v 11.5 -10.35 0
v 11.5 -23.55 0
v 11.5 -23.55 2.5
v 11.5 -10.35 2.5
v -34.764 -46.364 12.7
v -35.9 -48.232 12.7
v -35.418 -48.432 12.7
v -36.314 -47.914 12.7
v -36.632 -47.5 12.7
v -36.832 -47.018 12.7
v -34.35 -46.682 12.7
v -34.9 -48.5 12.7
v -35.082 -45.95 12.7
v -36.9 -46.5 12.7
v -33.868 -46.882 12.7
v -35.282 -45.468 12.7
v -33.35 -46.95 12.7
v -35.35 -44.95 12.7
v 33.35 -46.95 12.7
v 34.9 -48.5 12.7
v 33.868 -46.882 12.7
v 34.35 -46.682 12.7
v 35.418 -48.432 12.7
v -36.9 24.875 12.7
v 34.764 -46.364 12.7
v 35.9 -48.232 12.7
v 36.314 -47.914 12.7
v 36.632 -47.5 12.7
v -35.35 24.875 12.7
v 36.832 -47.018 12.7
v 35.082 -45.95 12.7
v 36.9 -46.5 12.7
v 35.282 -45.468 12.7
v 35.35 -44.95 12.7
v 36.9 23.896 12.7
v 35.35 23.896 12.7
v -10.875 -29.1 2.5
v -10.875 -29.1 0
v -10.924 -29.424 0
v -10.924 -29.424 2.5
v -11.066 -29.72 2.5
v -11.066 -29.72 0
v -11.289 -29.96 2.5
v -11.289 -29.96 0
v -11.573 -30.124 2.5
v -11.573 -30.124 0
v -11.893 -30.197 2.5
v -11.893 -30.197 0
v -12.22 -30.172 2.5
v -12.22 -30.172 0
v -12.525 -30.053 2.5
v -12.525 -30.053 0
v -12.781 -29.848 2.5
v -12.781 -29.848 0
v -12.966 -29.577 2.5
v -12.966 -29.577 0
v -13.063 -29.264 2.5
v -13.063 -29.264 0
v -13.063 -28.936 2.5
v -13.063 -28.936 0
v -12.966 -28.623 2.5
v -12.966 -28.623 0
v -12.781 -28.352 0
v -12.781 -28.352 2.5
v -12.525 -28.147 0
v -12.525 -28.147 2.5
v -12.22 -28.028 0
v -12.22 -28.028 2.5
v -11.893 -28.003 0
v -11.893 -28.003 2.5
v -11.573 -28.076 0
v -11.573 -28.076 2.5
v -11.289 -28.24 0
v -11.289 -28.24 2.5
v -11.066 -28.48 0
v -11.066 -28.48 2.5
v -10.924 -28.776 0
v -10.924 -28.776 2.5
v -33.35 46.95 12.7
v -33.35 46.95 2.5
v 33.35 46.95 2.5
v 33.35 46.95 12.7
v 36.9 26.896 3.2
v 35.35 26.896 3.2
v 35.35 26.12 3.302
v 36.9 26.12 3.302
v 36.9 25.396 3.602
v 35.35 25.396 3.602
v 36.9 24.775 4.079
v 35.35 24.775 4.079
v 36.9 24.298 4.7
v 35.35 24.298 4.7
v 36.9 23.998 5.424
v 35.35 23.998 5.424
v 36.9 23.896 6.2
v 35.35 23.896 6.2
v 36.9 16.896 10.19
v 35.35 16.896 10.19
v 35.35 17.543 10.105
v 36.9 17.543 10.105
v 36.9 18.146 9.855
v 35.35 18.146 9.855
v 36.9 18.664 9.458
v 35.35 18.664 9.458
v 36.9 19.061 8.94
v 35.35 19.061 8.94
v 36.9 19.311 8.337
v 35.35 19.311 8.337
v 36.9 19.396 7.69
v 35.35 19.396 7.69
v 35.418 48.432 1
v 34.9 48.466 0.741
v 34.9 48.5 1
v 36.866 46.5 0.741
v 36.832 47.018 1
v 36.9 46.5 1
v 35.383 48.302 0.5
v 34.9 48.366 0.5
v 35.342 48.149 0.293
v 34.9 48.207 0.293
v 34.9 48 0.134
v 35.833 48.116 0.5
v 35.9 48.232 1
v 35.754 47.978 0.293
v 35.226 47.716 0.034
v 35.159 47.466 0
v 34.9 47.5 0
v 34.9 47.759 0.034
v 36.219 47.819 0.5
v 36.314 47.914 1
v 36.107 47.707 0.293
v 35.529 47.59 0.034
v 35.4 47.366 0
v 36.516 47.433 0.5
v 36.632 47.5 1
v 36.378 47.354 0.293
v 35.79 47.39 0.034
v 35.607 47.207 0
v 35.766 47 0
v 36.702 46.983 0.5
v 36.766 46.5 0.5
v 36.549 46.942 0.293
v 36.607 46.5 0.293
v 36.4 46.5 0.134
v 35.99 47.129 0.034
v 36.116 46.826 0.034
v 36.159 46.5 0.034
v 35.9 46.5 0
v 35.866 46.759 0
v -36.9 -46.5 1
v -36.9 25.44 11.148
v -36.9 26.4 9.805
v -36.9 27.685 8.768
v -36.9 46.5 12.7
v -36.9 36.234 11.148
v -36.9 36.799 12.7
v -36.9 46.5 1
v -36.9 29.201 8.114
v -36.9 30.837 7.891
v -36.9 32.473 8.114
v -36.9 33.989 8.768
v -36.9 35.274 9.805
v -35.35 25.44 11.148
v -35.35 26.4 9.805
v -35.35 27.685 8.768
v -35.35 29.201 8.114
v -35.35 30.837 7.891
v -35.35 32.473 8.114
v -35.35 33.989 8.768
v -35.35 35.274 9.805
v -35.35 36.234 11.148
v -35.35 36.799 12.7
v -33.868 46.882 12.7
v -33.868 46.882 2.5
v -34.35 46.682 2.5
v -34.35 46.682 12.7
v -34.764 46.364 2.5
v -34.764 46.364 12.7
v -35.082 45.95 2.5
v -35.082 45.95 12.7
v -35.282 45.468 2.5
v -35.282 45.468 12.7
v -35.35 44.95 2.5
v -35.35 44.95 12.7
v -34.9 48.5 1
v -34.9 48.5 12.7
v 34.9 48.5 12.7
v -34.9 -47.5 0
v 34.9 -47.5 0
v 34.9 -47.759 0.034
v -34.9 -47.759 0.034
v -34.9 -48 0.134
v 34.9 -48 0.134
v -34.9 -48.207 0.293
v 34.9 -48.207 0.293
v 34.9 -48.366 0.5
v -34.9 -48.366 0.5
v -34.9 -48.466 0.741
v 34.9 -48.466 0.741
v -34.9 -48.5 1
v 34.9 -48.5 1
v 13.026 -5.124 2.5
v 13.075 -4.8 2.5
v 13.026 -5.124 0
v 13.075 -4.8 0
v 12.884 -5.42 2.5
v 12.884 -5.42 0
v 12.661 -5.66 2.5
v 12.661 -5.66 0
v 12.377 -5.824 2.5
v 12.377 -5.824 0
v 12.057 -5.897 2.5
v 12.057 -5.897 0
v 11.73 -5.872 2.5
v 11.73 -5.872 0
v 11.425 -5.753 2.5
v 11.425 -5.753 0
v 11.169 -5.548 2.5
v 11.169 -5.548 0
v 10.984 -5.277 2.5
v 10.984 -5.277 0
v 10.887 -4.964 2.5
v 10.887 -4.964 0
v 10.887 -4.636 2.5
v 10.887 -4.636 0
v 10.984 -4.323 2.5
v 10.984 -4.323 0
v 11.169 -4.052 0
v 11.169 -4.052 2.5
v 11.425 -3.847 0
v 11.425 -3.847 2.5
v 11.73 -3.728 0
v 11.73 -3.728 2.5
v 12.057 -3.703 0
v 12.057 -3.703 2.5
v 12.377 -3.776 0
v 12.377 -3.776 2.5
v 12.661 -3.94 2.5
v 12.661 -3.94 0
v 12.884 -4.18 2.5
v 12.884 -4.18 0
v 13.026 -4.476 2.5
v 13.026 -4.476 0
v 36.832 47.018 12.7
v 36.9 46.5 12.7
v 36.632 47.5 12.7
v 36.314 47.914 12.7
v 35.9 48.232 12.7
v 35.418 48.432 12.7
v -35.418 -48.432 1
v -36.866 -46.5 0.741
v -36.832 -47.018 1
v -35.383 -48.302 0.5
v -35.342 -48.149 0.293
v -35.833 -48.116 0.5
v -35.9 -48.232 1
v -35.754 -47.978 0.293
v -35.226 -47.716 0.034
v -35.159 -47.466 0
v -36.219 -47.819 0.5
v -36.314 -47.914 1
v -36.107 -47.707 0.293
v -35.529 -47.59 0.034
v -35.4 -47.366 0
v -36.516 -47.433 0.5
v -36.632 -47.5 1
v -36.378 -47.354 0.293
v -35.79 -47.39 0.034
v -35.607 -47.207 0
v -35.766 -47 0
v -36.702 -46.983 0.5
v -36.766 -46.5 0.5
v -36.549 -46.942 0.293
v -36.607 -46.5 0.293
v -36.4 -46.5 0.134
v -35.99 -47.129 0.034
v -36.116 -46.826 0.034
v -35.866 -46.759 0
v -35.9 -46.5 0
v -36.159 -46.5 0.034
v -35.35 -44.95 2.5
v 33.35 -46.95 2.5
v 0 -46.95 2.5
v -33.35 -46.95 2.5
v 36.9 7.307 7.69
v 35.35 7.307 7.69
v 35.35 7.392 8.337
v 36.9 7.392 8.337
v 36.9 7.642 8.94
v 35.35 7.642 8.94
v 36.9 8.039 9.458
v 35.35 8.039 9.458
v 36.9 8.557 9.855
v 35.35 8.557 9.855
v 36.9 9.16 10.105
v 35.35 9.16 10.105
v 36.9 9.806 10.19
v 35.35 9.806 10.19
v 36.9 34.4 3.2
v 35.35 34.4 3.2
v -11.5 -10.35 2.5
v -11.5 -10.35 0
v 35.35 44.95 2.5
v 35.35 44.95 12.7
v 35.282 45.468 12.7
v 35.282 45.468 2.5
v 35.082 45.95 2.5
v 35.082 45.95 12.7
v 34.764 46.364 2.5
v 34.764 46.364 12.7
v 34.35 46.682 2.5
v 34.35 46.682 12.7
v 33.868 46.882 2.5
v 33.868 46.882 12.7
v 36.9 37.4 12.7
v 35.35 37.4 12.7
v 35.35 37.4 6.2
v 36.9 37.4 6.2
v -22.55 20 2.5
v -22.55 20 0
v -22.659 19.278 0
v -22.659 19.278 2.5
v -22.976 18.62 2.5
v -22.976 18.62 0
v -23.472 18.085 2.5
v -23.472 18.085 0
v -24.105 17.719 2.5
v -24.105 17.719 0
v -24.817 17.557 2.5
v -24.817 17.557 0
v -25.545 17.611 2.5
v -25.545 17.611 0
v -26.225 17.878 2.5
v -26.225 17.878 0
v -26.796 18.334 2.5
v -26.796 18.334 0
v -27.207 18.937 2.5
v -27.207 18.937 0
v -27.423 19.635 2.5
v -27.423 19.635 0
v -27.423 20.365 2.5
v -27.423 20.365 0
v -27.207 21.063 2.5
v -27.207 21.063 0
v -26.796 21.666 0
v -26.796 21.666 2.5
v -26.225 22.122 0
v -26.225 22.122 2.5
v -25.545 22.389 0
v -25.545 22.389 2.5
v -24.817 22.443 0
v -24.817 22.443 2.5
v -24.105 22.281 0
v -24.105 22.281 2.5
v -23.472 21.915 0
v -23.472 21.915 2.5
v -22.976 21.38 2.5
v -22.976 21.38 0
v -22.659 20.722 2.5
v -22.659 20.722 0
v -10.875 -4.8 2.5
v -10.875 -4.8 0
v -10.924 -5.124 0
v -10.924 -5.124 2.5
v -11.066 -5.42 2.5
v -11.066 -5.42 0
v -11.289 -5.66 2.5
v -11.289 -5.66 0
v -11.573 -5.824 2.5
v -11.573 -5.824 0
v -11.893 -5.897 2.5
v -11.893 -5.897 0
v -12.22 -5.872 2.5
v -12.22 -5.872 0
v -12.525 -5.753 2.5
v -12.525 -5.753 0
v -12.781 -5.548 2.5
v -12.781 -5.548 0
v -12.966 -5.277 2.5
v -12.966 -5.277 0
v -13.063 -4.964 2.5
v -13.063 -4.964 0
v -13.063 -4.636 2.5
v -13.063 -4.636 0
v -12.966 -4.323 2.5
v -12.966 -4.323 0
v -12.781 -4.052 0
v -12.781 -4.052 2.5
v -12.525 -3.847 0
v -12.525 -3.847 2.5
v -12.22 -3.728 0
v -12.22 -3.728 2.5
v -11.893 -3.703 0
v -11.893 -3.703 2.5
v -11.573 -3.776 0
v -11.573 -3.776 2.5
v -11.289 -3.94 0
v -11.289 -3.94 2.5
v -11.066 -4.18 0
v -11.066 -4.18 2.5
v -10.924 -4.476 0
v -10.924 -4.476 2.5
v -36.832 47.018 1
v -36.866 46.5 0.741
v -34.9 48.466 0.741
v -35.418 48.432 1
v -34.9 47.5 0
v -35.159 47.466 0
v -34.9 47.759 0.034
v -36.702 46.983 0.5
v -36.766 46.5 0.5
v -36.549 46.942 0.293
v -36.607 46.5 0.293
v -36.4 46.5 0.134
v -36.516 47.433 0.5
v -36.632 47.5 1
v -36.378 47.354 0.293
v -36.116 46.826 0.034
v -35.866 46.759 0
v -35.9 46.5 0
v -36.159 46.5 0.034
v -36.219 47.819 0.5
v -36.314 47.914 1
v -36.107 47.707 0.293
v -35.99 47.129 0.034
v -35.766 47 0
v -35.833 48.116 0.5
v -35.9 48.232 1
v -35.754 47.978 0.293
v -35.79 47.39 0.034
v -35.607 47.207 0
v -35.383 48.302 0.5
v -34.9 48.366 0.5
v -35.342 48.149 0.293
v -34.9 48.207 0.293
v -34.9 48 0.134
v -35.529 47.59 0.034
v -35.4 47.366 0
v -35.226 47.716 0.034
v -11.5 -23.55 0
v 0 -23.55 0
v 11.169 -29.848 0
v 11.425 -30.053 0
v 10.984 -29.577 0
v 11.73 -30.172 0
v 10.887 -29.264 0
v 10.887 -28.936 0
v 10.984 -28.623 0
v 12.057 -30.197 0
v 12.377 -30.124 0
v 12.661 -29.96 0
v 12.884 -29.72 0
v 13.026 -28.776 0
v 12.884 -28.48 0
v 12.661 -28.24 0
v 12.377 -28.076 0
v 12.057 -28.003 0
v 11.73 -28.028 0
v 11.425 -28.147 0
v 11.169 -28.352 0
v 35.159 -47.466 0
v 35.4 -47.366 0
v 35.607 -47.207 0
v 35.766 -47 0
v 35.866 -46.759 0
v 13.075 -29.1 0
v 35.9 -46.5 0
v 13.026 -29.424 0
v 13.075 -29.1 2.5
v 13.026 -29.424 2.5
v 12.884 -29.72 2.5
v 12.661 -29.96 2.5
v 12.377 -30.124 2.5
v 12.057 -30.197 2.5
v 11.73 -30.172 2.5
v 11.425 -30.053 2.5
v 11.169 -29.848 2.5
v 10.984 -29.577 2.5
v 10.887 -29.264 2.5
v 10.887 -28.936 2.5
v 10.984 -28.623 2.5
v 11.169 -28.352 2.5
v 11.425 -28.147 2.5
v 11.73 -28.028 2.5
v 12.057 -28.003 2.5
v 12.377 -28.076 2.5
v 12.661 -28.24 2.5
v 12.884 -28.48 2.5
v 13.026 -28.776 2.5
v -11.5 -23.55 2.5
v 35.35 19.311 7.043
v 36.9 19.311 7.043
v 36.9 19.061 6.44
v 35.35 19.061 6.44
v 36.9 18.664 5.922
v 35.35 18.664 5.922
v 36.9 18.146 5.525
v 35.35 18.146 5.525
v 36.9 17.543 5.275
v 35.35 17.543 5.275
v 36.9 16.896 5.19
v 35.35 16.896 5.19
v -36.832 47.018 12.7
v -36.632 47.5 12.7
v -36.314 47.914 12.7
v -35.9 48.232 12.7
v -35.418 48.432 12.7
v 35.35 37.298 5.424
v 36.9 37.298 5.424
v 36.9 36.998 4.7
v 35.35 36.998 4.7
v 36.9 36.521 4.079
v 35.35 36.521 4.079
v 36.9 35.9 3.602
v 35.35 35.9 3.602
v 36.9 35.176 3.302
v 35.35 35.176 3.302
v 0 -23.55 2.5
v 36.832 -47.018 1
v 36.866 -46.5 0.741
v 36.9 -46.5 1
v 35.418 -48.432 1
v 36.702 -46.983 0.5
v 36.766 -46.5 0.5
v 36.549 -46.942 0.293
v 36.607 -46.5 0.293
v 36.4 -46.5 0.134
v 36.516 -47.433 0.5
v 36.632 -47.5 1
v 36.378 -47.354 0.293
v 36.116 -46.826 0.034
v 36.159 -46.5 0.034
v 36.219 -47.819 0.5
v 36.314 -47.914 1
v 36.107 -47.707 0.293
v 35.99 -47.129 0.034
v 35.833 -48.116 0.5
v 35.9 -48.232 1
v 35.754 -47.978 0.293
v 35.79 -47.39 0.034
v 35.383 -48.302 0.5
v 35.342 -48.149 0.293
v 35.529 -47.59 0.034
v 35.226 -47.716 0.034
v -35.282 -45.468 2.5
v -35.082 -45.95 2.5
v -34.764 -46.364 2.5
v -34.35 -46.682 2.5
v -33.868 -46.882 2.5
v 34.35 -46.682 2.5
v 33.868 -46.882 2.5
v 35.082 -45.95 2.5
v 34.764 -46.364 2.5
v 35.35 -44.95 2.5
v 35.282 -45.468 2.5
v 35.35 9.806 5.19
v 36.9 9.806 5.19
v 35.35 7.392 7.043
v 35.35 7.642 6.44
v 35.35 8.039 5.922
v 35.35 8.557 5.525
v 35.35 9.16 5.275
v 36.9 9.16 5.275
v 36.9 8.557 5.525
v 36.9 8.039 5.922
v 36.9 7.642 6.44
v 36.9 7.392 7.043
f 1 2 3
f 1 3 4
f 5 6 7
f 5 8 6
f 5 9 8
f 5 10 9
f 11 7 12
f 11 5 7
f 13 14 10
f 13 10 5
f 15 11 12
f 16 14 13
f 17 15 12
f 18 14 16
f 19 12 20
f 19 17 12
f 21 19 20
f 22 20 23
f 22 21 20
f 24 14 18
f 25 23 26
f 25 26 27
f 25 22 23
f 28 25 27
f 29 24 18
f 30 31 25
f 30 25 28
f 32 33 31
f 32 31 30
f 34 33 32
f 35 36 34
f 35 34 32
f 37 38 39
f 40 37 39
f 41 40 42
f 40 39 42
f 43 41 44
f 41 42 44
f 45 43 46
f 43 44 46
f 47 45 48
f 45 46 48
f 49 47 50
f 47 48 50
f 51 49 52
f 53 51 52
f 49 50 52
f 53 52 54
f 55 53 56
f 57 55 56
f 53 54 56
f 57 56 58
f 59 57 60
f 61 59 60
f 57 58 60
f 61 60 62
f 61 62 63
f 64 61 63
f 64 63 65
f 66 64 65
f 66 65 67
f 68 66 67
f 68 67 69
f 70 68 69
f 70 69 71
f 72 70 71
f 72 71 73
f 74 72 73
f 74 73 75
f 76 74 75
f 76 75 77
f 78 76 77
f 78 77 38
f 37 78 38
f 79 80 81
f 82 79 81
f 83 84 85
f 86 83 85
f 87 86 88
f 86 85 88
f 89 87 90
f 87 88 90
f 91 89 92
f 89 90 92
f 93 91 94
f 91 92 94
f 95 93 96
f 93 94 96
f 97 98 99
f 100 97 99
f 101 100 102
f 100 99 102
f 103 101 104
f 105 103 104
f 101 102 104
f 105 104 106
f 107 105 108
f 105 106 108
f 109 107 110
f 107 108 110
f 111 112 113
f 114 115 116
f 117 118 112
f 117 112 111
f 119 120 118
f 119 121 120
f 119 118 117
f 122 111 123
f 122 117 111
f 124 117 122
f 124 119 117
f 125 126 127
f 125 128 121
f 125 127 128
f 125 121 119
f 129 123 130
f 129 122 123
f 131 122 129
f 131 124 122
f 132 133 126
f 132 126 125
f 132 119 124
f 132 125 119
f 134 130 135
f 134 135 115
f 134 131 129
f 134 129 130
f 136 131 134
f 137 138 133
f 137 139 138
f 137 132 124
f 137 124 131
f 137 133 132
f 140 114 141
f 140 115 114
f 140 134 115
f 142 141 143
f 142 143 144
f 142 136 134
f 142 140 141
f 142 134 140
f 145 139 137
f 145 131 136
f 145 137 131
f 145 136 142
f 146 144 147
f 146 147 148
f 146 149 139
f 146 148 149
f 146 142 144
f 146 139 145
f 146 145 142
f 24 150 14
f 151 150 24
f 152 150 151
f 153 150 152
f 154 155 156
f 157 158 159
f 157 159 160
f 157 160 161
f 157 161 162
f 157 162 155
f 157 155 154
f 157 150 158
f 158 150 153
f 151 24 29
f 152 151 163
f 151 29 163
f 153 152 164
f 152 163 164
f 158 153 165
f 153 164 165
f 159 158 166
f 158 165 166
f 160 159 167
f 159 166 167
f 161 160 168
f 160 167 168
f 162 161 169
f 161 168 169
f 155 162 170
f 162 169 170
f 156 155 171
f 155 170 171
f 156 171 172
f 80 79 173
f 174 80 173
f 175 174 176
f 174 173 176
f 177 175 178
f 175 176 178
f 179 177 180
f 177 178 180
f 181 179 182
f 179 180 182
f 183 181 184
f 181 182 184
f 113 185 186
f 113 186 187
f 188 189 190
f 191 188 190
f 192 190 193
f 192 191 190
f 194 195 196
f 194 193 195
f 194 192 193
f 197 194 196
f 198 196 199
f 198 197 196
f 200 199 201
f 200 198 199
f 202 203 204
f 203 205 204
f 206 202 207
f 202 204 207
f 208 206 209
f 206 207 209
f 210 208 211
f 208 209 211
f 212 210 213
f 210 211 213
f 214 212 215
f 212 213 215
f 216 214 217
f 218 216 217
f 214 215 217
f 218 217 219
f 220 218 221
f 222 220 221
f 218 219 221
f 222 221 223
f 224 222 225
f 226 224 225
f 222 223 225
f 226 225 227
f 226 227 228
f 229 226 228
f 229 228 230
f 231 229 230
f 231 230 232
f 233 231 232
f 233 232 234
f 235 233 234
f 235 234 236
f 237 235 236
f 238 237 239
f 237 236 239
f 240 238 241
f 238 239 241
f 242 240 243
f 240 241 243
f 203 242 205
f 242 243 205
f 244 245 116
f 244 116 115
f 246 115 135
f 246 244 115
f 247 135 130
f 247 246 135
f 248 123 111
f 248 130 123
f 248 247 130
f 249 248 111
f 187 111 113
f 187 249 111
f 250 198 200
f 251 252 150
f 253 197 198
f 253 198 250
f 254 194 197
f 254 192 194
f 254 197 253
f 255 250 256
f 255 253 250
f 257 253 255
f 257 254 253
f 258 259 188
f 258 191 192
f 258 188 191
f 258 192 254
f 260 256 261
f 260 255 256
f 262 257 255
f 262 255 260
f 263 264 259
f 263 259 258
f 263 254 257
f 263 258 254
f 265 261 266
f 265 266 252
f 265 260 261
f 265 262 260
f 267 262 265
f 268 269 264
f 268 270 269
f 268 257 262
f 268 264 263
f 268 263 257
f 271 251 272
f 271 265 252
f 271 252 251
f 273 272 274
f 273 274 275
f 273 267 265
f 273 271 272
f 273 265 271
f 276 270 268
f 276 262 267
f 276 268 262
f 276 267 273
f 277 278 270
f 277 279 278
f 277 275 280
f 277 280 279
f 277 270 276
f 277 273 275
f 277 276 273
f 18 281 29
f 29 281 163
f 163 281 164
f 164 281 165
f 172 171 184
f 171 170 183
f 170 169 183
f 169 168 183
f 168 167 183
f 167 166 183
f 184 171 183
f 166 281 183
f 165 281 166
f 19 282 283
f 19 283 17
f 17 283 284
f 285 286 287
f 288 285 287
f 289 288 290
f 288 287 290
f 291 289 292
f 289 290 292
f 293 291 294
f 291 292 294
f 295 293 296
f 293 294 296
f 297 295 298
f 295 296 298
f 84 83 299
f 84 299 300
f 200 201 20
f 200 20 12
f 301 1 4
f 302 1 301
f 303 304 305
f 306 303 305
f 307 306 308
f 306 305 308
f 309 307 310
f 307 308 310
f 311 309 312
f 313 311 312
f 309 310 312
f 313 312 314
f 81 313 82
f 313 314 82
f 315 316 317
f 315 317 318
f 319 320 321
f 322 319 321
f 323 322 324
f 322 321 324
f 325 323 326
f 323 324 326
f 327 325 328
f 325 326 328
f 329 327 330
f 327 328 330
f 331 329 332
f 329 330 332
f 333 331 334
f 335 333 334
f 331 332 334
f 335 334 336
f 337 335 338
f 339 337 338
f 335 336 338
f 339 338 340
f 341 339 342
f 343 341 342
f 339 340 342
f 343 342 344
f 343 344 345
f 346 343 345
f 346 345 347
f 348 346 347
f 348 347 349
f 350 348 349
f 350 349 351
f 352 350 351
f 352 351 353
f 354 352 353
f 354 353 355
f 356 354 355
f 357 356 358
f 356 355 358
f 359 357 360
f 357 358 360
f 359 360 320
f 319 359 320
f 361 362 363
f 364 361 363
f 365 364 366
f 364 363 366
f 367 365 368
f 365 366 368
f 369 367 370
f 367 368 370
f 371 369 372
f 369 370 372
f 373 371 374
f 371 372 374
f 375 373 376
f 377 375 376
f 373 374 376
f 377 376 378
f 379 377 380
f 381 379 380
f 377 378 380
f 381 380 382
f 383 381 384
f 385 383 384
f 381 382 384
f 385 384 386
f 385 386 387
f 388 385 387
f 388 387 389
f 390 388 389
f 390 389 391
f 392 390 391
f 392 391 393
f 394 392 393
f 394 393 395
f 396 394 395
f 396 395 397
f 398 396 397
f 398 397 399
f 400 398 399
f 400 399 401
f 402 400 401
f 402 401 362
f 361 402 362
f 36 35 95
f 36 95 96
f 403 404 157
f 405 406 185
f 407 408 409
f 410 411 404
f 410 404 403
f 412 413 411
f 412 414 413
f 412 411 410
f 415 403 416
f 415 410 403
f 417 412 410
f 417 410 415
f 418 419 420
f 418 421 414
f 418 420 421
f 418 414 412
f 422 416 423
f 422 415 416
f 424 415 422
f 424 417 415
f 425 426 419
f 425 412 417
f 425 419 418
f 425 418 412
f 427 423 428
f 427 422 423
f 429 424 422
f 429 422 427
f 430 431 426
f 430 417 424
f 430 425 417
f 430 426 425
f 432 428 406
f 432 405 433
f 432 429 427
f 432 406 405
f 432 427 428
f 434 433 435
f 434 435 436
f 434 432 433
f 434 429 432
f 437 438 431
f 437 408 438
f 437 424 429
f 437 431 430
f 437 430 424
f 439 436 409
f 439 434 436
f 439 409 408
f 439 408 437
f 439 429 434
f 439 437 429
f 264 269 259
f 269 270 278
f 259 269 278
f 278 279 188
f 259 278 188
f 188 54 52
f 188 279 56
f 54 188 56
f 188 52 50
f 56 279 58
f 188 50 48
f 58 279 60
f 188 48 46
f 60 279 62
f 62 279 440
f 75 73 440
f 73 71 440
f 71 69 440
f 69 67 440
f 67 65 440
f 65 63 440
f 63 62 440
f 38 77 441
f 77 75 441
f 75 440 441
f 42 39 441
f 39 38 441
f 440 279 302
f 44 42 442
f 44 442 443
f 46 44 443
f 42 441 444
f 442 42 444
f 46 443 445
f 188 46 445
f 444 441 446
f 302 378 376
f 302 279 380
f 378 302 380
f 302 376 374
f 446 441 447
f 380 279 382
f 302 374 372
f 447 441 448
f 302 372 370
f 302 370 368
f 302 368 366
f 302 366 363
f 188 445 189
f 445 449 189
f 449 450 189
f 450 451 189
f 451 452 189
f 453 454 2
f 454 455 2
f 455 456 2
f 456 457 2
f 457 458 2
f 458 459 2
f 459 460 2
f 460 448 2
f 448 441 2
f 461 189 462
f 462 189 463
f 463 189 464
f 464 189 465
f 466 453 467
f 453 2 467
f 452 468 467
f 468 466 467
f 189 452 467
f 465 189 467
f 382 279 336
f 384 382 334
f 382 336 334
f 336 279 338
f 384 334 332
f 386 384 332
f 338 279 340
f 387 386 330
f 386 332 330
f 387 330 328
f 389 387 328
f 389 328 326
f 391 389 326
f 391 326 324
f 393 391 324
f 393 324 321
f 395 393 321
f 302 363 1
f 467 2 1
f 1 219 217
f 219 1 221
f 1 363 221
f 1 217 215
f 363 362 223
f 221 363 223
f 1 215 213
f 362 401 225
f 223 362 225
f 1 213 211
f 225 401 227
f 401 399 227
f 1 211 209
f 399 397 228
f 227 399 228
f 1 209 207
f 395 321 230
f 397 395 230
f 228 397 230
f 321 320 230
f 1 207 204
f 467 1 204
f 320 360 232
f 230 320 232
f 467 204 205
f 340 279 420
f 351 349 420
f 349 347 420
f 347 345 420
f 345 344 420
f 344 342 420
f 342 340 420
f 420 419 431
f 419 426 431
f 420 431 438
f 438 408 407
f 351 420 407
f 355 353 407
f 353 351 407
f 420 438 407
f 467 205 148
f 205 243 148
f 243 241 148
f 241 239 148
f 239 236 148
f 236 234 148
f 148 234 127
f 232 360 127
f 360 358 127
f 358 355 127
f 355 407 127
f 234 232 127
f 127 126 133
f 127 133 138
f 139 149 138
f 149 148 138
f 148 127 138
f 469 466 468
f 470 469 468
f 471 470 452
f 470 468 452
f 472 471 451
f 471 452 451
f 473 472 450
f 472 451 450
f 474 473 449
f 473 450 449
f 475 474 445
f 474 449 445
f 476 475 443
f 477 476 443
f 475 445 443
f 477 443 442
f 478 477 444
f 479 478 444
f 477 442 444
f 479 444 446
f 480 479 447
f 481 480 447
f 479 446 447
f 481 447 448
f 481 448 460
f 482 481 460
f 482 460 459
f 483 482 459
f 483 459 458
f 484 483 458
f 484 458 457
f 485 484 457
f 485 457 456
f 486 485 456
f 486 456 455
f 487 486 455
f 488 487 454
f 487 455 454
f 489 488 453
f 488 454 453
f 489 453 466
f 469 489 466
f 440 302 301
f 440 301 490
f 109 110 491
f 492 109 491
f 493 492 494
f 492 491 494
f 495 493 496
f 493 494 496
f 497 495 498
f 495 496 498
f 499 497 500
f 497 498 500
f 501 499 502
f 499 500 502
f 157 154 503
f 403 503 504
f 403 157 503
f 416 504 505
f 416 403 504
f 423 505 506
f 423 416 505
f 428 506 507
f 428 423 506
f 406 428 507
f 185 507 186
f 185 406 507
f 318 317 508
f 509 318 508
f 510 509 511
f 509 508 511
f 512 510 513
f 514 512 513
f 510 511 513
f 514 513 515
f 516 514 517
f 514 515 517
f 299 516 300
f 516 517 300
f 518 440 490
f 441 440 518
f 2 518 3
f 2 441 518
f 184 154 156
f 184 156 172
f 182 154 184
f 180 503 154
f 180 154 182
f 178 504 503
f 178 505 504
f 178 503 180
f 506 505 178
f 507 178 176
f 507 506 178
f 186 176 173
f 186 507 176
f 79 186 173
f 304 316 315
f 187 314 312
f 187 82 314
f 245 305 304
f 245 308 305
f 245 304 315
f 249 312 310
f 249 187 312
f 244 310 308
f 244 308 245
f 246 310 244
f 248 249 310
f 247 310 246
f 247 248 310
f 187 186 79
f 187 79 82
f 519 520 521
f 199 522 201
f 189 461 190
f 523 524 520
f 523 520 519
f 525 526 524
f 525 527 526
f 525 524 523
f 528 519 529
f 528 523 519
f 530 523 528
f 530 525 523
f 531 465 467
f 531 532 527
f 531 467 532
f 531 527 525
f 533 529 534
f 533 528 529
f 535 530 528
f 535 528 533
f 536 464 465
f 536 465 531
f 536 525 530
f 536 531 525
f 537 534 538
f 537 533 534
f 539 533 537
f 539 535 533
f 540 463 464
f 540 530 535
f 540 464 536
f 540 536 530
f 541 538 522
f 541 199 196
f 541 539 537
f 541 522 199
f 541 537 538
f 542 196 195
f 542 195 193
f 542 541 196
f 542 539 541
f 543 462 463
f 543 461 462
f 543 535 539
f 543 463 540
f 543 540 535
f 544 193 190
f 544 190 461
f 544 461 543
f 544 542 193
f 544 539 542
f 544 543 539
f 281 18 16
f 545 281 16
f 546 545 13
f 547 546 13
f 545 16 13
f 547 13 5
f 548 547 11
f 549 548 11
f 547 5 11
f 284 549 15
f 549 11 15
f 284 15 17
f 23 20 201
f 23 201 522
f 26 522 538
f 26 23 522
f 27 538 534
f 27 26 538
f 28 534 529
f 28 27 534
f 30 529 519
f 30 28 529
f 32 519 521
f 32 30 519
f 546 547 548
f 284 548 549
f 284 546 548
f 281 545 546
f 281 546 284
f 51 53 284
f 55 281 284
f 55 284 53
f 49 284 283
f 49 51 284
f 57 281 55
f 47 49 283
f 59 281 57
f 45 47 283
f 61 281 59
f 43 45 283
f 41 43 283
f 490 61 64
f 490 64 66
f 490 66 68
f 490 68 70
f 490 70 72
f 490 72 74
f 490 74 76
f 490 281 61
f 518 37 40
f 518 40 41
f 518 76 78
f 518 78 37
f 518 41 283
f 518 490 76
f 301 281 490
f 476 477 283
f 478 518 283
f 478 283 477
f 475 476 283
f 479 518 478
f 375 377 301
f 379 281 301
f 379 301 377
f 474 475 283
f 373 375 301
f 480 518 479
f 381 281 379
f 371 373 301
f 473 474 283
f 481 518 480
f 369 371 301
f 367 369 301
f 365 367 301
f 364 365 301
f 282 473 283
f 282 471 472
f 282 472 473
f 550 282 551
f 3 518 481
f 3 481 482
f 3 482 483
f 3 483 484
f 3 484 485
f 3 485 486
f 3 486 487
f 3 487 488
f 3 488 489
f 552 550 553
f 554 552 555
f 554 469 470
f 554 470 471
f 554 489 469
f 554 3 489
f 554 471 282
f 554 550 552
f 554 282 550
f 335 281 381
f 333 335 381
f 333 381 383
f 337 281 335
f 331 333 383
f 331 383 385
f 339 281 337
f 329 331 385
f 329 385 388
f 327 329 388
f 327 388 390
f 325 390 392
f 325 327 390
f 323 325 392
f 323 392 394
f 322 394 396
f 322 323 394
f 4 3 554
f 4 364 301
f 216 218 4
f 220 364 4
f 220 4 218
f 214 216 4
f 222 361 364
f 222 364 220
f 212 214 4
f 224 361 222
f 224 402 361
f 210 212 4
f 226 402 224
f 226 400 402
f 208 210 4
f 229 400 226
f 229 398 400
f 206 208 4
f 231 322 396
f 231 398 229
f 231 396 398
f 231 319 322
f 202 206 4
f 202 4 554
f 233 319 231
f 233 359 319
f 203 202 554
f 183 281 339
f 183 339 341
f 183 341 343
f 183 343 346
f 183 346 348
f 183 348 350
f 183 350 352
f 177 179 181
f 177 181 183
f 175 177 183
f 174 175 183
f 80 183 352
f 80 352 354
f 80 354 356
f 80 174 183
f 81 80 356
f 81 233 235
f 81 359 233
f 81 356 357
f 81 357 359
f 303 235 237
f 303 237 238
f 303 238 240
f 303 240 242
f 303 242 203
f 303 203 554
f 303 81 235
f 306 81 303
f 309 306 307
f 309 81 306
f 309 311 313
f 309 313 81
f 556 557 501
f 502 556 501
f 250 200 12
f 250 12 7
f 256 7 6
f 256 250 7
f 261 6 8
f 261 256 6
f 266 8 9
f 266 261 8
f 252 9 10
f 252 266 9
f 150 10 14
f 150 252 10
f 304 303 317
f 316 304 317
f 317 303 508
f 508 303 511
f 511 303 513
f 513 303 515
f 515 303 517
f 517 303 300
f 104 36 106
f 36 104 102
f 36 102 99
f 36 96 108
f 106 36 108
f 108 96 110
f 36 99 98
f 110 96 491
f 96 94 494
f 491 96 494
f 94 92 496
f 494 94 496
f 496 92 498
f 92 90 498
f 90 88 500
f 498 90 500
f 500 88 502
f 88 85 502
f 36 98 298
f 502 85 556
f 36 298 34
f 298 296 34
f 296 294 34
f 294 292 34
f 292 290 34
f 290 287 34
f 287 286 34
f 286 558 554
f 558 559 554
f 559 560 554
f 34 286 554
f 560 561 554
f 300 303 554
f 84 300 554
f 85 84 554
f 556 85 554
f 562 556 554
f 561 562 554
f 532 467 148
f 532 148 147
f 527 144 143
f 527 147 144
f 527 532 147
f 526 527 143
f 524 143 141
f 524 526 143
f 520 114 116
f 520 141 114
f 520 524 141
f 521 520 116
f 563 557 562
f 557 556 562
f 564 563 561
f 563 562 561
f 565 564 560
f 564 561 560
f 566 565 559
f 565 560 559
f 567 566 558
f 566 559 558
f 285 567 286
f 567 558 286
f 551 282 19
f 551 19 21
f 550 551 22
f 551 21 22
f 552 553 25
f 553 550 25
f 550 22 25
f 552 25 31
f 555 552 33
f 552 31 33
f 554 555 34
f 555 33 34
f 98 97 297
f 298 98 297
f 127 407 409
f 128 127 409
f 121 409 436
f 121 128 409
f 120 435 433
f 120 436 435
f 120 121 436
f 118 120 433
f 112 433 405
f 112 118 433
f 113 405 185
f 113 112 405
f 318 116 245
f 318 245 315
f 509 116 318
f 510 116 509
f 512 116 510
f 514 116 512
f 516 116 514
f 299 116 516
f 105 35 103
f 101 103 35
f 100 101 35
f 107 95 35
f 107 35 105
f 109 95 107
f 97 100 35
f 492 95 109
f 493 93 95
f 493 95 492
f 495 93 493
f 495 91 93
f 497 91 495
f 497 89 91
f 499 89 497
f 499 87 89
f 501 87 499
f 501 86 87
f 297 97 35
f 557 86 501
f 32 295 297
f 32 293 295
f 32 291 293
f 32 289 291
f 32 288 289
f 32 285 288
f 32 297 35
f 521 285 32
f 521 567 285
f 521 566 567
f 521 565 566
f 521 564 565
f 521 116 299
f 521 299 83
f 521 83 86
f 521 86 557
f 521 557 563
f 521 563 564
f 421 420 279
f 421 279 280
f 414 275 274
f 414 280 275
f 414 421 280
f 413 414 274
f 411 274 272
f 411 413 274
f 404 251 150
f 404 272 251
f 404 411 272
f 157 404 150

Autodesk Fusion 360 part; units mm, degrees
sketch "Sketch1" plane through (0, 0, 0) normal (0, 0, 1) x (1, 0, 0)
  line L0 (36.9, -48.5) -> (-36.9, -48.5)
  line L1 (-36.9, -48.5) -> (-36.9, 48.5)
  line L2 (-36.9, 48.5) -> (36.9, 48.5)
  line L3 (36.9, 48.5) -> (36.9, -48.5)
  line L4 (36.9, -48.5) -> (-36.9, 48.5) construction
  line L5 (-36.9, -48.5) -> (36.9, 48.5) construction
  line L6 (35.35, -46.95) -> (-35.35, -46.95)
  line L7 (-35.35, -46.95) -> (-35.35, 46.95)
  line L8 (-35.35, 46.95) -> (35.35, 46.95)
  line L9 (35.35, 46.95) -> (35.35, -46.95)
  line L10 (35.35, -46.95) -> (-35.35, 46.95) construction
  line L11 (-35.35, -46.95) -> (35.35, 46.95) construction
  line L12 (35.35, -46.95) -> (0, -46.95)
  line L13 (0, -46.95) -> (0, -16.95)
  line L14 (11.5, -10.35) -> (-11.5, -10.35)
  line L15 (-11.5, -10.35) -> (-11.5, -23.55)
  line L16 (-11.5, -23.55) -> (11.5, -23.55)
  line L17 (11.5, -23.55) -> (11.5, -10.35)
  line L18 (11.5, -10.35) -> (-11.5, -23.55) construction
  line L19 (-11.5, -10.35) -> (11.5, -23.55) construction
  line L20 (13.775, -30.9) -> (-13.775, -30.9)
  line L21 (-13.775, -30.9) -> (-13.775, -3)
  line L22 (-13.775, -3) -> (13.775, -3)
  line L23 (13.775, -3) -> (13.775, -30.9)
  line L24 (13.775, -30.9) -> (-13.775, -3) construction
  line L25 (-13.775, -30.9) -> (13.775, -3) construction
  line L26 (13.775, -3) -> (11.975, -3)
  line L27 (-13.775, -3) -> (-11.975, -3)
  line L28 (-13.775, -30.9) -> (-11.975, -30.9)
  line L29 (13.775, -30.9) -> (11.975, -30.9)
  line L30 (-11.975, -30.9) -> (-13.775, -30.9)
  line L31 (-13.775, -30.9) -> (-13.775, -29.1)
  line L32 (-13.775, -29.1) -> (-11.975, -29.1)
  line L33 (-11.975, -29.1) -> (-11.975, -30.9)
  line L34 (11.975, -30.9) -> (13.775, -30.9)
  line L35 (13.775, -30.9) -> (13.775, -29.1)
  line L36 (13.775, -29.1) -> (11.975, -29.1)
  line L37 (11.975, -29.1) -> (11.975, -30.9)
  line L38 (-11.975, -3) -> (-13.775, -3)
  line L39 (-13.775, -3) -> (-13.775, -4.8)
  line L40 (-13.775, -4.8) -> (-11.975, -4.8)
  line L41 (-11.975, -4.8) -> (-11.975, -3)
  line L42 (11.975, -3) -> (13.775, -3)
  line L43 (13.775, -3) -> (13.775, -4.8)
  line L44 (13.775, -4.8) -> (11.975, -4.8)
  line L45 (11.975, -4.8) -> (11.975, -3)
  circle A0 centre (-11.975, -4.8) radius 1.1
  circle A1 centre (11.975, -4.8) radius 1.1
  circle A2 centre (11.975, -29.1) radius 1.1
  circle A3 centre (-11.975, -29.1) radius 1.1
  circle A4 centre (-25, 20) radius 2.45
  point P0 (0, -16.95)
  point P1 (0, -16.95)
  dimension "d1" = 73.8
  dimension "d2" = 97
  dimension "d3" = 70.7
  dimension "d4" = 93.9
  dimension "d48" = 30
  dimension "d49" = 23
  dimension "d50" = 13.2
  dimension "d51" = 27.55
  dimension "d52" = 27.9
  dimension "d53" = 1.8
  dimension "d54" = 1.8
  dimension "d55" = 1.8
  dimension "d56" = 1.8
  dimension "d57" = 1.8
  dimension "d58" = 1.8
  dimension "d59" = 1.8
  dimension "d60" = 1.8
  dimension "d61" = 2.2
  dimension "d62" = 2.2
  dimension "d63" = 2.2
  dimension "d64" = 2.2
  dimension "d67" = 4.9
extrude "Extrude1" add sketch "Sketch1" along normal blind 2.5 contours L0 L1 L2 L3 | L14 L15 L16 L17 | L20 L21 L22 L23 L32 L33 L36 L37 L40 L41 L44 L45 A0 A1 A2 A3 | L6 L7 L8 L9 L12 | L20 L23 L29 L34 L35 L36 L37 A2 | L20 L21 L28 L30 L31 L32 L33 A3 | L36 L37 A2 | L36 L37 A2 | L32 L33 A3 | L32 L33 A3 | L22 L23 L26 L42 L43 L44 L45 A1 | L21 L22 L27 L38 L39 L40 L41 A0 | L44 L45 A1 | L44 L45 A1 | L40 L41 A0 | L40 L41 A0 | A4
extrude "Extrude2" add sketch "Sketch1" along normal blind 12.7 contours L0 L1 L2 L3
fillet "Fillet1" radius 2 8 edges at (-35.35, 46.95, 7.6) (35.35, 46.95, 7.6) (35.35, -46.95, 7.6) (-35.35, -46.95, 7.6) (-36.9, -48.5, 6.35) (36.9, -48.5, 6.35) (36.9, 48.5, 6.35) (-36.9, 48.5, 6.35)
fillet "Fillet2" radius 1 8 edges at (-36.3142, -47.9142, 0) (0, -48.5, 0) (36.3142, -47.9142, 0) (36.9, 0, 0) (36.3142, 47.9142, 0) (0, 48.5, 0) (-36.3142, 47.9142, 0) (-36.9, 0, 0)
sketch "Sketch2" plane through (0, 0, 12.7) normal (0, 0, 1) x (-1, 0, 0)
  line L0 (33.35, -46.95) -> (-33.35, -46.95)
  arc A0 (-35.35, -44.95) -> (-33.35, -46.95) centre (-33.35, -44.95) ccw
  line L1 (-35.35, -44.95) -> (-35.35, 44.95)
  arc A1 (-33.35, 46.95) -> (-35.35, 44.95) centre (-33.35, 44.95) ccw
  line L2 (-33.35, 46.95) -> (33.35, 46.95)
  arc A2 (35.35, 44.95) -> (33.35, 46.95) centre (33.35, 44.95) ccw
  line L3 (35.35, 44.95) -> (35.35, -44.95)
  arc A3 (33.35, -46.95) -> (35.35, -44.95) centre (33.35, -44.95) ccw
  arc A4 (34.9, -48.5) -> (36.9, -46.5) centre (34.9, -46.5) ccw
  line L4 (36.9, -46.5) -> (36.9, 46.5)
  arc A5 (36.9, 46.5) -> (34.9, 48.5) centre (34.9, 46.5) ccw
  line L5 (34.9, 48.5) -> (-34.9, 48.5)
  arc A6 (-34.9, 48.5) -> (-36.9, 46.5) centre (-34.9, 46.5) ccw
  line L6 (-36.9, 46.5) -> (-36.9, -46.5)
  arc A7 (-36.9, -46.5) -> (-34.9, -48.5) centre (-34.9, -46.5) ccw
  line L7 (-34.9, -48.5) -> (34.9, -48.5)
  line L8 (-34.9, 48.5) -> (-34.9, 37.6)
  line L9 (-34.9, 37.6) -> (-35.35, 37.6)
  line L10 (-35.35, 37.6) -> (-36.9, 37.6)
  line L11 (-36.9, 37.6) -> (-36.9, 24.096)
  line L12 (-36.9, 24.096) -> (-35.35, 24.096)
  line L13 (-35.35, 24.096) -> (-35.35, 37.6)
  line L14 (-34.9, 48.5) -> (-34.9, -48.5)
  line L15 (-34.9, -48.5) -> (-34.9, -37.6)
  line L16 (-34.9, -37.6) -> (-34.9, -24.096)
  line L17 (-34.9, -24.096) -> (-36.4, -24.096)
  line L18 (-36.9, -23.896) -> (-25.5, -23.896)
  line L19 (-25.5, -23.896) -> (-25.5, -37.4)
  line L20 (-25.5, -37.4) -> (-36.9, -37.4)
  line L21 (-36.9, -37.4) -> (-36.9, -23.896)
  line L22 (-36.9, -23.896) -> (-36.9, -19.396)
  line L23 (-34.9, -48.5) -> (-34.9, -37.6)
  line L24 (-34.9, -37.6) -> (-36.9, -37.5994)
  dimension "d13" = 10.9
  dimension "d14" = 13.504
  dimension "d19" = 10.9
  dimension "d20" = 13.504
  dimension "d21" = 1.5
  dimension "d22" = 13.504
  dimension "d31" = 4.5
  dimension "d47" = 10.9
extrude "Extrude5" cut sketch "Sketch2" against normal blind 9.5 contours L1 L14 L16 L17 L20 | L1 L6 L18 L20 L21
fillet "Fillet5" radius 3 2 edges at (36.125, 23.896, 3.2) (36.125, 37.4, 3.2)
sketch "Sketch3" plane through (36.9, 0, 0) normal (1, 0, 0) x (0, 1, 0)
  line L0 (37.4, 12.7) -> (37.4, 6.2)
  arc A0 (34.4, 3.2) -> (37.4, 6.2) centre (34.4, 6.2) ccw
  line L1 (34.4, 3.2) -> (26.896, 3.2)
  arc A1 (23.896, 6.2) -> (26.896, 3.2) centre (26.896, 6.2) ccw
  line L2 (23.896, 6.2) -> (23.896, 12.7)
  line L3 (23.896, 12.7) -> (-46.5, 12.7)
  line L4 (-46.5, 12.7) -> (-46.5, 1)
  line L5 (-46.5, 1) -> (46.5, 1)
  line L6 (46.5, 1) -> (46.5, 12.7)
  line L7 (46.5, 12.7) -> (37.4, 12.7)
  line L8 (23.896, 12.7) -> (19.396, 12.7)
  line L9 (19.396, 12.7) -> (19.396, 2.68)
  line L10 (19.396, 12.7) -> (19.396, 10.19)
  line L11 (19.396, 10.19) -> (7.307, 10.19)
  line L12 (7.307, 10.19) -> (7.307, 5.19)
  line L13 (7.307, 5.19) -> (19.396, 5.19)
  line L14 (19.396, 5.19) -> (19.396, 10.19)
  dimension "d32" = 4.5
  dimension "d33" = 10.02
  dimension "d34" = 2.51
  dimension "d35" = 12.089
  dimension "d36" = 5
extrude "Extrude6" cut sketch "Sketch3" against normal blind 2 contours L9 L11 L12 L13 L14
fillet "Fillet6" radius 2.5 4 edges at (36.125, 7.307, 10.19) (36.125, 19.396, 10.19) (36.125, 19.396, 5.19) (36.125, 7.307, 5.19)
sketch "Sketch4" plane through (-35.35, 0, 0) normal (1, 0, 0) x (0, 1, 0)
  line L0 (-44.95, 12.7) -> (-44.95, 2.5)
  line L1 (-44.95, 2.5) -> (44.95, 2.5)
  line L2 (44.95, 2.5) -> (44.95, 12.7)
  line L3 (44.95, 12.7) -> (-44.95, 12.7)
  line L4 (44.95, 12.7) -> (30.837, 12.7)
  line L5 (30.837, 12.7) -> (30.837, 7.306)
  line L6 (30.837, 12.7) -> (30.837, 2.5)
  line L7 (30.837, 2.5) -> (30.837, 13.991)
  circle A0 centre (30.837, 13.991) radius 6.1
  line L8 (36.7988, 12.7) -> (44.95, 12.7)
  dimension "d41" = 14.113
  dimension "d42" = 5.394
  dimension "d43" = 11.491
  dimension "d44" = 12.2
extrude "Extrude7" cut sketch "Sketch4" against normal blind 2 contours L3 L5 L6 L7 A0 | L3 L4 L5 L6 L7 A0
extrude "Extrude8" cut sketch "Sketch1" along normal blind 4 contours L14 L15 L16 L17 | L36 L37 A2 | L36 L37 A2 | L32 L33 A3 | L32 L33 A3 | L44 L45 A1 | L44 L45 A1 | L40 L41 A0 | L40 L41 A0
extrude "Extrude9" cut sketch "Sketch1" along normal blind 5 contours A4
